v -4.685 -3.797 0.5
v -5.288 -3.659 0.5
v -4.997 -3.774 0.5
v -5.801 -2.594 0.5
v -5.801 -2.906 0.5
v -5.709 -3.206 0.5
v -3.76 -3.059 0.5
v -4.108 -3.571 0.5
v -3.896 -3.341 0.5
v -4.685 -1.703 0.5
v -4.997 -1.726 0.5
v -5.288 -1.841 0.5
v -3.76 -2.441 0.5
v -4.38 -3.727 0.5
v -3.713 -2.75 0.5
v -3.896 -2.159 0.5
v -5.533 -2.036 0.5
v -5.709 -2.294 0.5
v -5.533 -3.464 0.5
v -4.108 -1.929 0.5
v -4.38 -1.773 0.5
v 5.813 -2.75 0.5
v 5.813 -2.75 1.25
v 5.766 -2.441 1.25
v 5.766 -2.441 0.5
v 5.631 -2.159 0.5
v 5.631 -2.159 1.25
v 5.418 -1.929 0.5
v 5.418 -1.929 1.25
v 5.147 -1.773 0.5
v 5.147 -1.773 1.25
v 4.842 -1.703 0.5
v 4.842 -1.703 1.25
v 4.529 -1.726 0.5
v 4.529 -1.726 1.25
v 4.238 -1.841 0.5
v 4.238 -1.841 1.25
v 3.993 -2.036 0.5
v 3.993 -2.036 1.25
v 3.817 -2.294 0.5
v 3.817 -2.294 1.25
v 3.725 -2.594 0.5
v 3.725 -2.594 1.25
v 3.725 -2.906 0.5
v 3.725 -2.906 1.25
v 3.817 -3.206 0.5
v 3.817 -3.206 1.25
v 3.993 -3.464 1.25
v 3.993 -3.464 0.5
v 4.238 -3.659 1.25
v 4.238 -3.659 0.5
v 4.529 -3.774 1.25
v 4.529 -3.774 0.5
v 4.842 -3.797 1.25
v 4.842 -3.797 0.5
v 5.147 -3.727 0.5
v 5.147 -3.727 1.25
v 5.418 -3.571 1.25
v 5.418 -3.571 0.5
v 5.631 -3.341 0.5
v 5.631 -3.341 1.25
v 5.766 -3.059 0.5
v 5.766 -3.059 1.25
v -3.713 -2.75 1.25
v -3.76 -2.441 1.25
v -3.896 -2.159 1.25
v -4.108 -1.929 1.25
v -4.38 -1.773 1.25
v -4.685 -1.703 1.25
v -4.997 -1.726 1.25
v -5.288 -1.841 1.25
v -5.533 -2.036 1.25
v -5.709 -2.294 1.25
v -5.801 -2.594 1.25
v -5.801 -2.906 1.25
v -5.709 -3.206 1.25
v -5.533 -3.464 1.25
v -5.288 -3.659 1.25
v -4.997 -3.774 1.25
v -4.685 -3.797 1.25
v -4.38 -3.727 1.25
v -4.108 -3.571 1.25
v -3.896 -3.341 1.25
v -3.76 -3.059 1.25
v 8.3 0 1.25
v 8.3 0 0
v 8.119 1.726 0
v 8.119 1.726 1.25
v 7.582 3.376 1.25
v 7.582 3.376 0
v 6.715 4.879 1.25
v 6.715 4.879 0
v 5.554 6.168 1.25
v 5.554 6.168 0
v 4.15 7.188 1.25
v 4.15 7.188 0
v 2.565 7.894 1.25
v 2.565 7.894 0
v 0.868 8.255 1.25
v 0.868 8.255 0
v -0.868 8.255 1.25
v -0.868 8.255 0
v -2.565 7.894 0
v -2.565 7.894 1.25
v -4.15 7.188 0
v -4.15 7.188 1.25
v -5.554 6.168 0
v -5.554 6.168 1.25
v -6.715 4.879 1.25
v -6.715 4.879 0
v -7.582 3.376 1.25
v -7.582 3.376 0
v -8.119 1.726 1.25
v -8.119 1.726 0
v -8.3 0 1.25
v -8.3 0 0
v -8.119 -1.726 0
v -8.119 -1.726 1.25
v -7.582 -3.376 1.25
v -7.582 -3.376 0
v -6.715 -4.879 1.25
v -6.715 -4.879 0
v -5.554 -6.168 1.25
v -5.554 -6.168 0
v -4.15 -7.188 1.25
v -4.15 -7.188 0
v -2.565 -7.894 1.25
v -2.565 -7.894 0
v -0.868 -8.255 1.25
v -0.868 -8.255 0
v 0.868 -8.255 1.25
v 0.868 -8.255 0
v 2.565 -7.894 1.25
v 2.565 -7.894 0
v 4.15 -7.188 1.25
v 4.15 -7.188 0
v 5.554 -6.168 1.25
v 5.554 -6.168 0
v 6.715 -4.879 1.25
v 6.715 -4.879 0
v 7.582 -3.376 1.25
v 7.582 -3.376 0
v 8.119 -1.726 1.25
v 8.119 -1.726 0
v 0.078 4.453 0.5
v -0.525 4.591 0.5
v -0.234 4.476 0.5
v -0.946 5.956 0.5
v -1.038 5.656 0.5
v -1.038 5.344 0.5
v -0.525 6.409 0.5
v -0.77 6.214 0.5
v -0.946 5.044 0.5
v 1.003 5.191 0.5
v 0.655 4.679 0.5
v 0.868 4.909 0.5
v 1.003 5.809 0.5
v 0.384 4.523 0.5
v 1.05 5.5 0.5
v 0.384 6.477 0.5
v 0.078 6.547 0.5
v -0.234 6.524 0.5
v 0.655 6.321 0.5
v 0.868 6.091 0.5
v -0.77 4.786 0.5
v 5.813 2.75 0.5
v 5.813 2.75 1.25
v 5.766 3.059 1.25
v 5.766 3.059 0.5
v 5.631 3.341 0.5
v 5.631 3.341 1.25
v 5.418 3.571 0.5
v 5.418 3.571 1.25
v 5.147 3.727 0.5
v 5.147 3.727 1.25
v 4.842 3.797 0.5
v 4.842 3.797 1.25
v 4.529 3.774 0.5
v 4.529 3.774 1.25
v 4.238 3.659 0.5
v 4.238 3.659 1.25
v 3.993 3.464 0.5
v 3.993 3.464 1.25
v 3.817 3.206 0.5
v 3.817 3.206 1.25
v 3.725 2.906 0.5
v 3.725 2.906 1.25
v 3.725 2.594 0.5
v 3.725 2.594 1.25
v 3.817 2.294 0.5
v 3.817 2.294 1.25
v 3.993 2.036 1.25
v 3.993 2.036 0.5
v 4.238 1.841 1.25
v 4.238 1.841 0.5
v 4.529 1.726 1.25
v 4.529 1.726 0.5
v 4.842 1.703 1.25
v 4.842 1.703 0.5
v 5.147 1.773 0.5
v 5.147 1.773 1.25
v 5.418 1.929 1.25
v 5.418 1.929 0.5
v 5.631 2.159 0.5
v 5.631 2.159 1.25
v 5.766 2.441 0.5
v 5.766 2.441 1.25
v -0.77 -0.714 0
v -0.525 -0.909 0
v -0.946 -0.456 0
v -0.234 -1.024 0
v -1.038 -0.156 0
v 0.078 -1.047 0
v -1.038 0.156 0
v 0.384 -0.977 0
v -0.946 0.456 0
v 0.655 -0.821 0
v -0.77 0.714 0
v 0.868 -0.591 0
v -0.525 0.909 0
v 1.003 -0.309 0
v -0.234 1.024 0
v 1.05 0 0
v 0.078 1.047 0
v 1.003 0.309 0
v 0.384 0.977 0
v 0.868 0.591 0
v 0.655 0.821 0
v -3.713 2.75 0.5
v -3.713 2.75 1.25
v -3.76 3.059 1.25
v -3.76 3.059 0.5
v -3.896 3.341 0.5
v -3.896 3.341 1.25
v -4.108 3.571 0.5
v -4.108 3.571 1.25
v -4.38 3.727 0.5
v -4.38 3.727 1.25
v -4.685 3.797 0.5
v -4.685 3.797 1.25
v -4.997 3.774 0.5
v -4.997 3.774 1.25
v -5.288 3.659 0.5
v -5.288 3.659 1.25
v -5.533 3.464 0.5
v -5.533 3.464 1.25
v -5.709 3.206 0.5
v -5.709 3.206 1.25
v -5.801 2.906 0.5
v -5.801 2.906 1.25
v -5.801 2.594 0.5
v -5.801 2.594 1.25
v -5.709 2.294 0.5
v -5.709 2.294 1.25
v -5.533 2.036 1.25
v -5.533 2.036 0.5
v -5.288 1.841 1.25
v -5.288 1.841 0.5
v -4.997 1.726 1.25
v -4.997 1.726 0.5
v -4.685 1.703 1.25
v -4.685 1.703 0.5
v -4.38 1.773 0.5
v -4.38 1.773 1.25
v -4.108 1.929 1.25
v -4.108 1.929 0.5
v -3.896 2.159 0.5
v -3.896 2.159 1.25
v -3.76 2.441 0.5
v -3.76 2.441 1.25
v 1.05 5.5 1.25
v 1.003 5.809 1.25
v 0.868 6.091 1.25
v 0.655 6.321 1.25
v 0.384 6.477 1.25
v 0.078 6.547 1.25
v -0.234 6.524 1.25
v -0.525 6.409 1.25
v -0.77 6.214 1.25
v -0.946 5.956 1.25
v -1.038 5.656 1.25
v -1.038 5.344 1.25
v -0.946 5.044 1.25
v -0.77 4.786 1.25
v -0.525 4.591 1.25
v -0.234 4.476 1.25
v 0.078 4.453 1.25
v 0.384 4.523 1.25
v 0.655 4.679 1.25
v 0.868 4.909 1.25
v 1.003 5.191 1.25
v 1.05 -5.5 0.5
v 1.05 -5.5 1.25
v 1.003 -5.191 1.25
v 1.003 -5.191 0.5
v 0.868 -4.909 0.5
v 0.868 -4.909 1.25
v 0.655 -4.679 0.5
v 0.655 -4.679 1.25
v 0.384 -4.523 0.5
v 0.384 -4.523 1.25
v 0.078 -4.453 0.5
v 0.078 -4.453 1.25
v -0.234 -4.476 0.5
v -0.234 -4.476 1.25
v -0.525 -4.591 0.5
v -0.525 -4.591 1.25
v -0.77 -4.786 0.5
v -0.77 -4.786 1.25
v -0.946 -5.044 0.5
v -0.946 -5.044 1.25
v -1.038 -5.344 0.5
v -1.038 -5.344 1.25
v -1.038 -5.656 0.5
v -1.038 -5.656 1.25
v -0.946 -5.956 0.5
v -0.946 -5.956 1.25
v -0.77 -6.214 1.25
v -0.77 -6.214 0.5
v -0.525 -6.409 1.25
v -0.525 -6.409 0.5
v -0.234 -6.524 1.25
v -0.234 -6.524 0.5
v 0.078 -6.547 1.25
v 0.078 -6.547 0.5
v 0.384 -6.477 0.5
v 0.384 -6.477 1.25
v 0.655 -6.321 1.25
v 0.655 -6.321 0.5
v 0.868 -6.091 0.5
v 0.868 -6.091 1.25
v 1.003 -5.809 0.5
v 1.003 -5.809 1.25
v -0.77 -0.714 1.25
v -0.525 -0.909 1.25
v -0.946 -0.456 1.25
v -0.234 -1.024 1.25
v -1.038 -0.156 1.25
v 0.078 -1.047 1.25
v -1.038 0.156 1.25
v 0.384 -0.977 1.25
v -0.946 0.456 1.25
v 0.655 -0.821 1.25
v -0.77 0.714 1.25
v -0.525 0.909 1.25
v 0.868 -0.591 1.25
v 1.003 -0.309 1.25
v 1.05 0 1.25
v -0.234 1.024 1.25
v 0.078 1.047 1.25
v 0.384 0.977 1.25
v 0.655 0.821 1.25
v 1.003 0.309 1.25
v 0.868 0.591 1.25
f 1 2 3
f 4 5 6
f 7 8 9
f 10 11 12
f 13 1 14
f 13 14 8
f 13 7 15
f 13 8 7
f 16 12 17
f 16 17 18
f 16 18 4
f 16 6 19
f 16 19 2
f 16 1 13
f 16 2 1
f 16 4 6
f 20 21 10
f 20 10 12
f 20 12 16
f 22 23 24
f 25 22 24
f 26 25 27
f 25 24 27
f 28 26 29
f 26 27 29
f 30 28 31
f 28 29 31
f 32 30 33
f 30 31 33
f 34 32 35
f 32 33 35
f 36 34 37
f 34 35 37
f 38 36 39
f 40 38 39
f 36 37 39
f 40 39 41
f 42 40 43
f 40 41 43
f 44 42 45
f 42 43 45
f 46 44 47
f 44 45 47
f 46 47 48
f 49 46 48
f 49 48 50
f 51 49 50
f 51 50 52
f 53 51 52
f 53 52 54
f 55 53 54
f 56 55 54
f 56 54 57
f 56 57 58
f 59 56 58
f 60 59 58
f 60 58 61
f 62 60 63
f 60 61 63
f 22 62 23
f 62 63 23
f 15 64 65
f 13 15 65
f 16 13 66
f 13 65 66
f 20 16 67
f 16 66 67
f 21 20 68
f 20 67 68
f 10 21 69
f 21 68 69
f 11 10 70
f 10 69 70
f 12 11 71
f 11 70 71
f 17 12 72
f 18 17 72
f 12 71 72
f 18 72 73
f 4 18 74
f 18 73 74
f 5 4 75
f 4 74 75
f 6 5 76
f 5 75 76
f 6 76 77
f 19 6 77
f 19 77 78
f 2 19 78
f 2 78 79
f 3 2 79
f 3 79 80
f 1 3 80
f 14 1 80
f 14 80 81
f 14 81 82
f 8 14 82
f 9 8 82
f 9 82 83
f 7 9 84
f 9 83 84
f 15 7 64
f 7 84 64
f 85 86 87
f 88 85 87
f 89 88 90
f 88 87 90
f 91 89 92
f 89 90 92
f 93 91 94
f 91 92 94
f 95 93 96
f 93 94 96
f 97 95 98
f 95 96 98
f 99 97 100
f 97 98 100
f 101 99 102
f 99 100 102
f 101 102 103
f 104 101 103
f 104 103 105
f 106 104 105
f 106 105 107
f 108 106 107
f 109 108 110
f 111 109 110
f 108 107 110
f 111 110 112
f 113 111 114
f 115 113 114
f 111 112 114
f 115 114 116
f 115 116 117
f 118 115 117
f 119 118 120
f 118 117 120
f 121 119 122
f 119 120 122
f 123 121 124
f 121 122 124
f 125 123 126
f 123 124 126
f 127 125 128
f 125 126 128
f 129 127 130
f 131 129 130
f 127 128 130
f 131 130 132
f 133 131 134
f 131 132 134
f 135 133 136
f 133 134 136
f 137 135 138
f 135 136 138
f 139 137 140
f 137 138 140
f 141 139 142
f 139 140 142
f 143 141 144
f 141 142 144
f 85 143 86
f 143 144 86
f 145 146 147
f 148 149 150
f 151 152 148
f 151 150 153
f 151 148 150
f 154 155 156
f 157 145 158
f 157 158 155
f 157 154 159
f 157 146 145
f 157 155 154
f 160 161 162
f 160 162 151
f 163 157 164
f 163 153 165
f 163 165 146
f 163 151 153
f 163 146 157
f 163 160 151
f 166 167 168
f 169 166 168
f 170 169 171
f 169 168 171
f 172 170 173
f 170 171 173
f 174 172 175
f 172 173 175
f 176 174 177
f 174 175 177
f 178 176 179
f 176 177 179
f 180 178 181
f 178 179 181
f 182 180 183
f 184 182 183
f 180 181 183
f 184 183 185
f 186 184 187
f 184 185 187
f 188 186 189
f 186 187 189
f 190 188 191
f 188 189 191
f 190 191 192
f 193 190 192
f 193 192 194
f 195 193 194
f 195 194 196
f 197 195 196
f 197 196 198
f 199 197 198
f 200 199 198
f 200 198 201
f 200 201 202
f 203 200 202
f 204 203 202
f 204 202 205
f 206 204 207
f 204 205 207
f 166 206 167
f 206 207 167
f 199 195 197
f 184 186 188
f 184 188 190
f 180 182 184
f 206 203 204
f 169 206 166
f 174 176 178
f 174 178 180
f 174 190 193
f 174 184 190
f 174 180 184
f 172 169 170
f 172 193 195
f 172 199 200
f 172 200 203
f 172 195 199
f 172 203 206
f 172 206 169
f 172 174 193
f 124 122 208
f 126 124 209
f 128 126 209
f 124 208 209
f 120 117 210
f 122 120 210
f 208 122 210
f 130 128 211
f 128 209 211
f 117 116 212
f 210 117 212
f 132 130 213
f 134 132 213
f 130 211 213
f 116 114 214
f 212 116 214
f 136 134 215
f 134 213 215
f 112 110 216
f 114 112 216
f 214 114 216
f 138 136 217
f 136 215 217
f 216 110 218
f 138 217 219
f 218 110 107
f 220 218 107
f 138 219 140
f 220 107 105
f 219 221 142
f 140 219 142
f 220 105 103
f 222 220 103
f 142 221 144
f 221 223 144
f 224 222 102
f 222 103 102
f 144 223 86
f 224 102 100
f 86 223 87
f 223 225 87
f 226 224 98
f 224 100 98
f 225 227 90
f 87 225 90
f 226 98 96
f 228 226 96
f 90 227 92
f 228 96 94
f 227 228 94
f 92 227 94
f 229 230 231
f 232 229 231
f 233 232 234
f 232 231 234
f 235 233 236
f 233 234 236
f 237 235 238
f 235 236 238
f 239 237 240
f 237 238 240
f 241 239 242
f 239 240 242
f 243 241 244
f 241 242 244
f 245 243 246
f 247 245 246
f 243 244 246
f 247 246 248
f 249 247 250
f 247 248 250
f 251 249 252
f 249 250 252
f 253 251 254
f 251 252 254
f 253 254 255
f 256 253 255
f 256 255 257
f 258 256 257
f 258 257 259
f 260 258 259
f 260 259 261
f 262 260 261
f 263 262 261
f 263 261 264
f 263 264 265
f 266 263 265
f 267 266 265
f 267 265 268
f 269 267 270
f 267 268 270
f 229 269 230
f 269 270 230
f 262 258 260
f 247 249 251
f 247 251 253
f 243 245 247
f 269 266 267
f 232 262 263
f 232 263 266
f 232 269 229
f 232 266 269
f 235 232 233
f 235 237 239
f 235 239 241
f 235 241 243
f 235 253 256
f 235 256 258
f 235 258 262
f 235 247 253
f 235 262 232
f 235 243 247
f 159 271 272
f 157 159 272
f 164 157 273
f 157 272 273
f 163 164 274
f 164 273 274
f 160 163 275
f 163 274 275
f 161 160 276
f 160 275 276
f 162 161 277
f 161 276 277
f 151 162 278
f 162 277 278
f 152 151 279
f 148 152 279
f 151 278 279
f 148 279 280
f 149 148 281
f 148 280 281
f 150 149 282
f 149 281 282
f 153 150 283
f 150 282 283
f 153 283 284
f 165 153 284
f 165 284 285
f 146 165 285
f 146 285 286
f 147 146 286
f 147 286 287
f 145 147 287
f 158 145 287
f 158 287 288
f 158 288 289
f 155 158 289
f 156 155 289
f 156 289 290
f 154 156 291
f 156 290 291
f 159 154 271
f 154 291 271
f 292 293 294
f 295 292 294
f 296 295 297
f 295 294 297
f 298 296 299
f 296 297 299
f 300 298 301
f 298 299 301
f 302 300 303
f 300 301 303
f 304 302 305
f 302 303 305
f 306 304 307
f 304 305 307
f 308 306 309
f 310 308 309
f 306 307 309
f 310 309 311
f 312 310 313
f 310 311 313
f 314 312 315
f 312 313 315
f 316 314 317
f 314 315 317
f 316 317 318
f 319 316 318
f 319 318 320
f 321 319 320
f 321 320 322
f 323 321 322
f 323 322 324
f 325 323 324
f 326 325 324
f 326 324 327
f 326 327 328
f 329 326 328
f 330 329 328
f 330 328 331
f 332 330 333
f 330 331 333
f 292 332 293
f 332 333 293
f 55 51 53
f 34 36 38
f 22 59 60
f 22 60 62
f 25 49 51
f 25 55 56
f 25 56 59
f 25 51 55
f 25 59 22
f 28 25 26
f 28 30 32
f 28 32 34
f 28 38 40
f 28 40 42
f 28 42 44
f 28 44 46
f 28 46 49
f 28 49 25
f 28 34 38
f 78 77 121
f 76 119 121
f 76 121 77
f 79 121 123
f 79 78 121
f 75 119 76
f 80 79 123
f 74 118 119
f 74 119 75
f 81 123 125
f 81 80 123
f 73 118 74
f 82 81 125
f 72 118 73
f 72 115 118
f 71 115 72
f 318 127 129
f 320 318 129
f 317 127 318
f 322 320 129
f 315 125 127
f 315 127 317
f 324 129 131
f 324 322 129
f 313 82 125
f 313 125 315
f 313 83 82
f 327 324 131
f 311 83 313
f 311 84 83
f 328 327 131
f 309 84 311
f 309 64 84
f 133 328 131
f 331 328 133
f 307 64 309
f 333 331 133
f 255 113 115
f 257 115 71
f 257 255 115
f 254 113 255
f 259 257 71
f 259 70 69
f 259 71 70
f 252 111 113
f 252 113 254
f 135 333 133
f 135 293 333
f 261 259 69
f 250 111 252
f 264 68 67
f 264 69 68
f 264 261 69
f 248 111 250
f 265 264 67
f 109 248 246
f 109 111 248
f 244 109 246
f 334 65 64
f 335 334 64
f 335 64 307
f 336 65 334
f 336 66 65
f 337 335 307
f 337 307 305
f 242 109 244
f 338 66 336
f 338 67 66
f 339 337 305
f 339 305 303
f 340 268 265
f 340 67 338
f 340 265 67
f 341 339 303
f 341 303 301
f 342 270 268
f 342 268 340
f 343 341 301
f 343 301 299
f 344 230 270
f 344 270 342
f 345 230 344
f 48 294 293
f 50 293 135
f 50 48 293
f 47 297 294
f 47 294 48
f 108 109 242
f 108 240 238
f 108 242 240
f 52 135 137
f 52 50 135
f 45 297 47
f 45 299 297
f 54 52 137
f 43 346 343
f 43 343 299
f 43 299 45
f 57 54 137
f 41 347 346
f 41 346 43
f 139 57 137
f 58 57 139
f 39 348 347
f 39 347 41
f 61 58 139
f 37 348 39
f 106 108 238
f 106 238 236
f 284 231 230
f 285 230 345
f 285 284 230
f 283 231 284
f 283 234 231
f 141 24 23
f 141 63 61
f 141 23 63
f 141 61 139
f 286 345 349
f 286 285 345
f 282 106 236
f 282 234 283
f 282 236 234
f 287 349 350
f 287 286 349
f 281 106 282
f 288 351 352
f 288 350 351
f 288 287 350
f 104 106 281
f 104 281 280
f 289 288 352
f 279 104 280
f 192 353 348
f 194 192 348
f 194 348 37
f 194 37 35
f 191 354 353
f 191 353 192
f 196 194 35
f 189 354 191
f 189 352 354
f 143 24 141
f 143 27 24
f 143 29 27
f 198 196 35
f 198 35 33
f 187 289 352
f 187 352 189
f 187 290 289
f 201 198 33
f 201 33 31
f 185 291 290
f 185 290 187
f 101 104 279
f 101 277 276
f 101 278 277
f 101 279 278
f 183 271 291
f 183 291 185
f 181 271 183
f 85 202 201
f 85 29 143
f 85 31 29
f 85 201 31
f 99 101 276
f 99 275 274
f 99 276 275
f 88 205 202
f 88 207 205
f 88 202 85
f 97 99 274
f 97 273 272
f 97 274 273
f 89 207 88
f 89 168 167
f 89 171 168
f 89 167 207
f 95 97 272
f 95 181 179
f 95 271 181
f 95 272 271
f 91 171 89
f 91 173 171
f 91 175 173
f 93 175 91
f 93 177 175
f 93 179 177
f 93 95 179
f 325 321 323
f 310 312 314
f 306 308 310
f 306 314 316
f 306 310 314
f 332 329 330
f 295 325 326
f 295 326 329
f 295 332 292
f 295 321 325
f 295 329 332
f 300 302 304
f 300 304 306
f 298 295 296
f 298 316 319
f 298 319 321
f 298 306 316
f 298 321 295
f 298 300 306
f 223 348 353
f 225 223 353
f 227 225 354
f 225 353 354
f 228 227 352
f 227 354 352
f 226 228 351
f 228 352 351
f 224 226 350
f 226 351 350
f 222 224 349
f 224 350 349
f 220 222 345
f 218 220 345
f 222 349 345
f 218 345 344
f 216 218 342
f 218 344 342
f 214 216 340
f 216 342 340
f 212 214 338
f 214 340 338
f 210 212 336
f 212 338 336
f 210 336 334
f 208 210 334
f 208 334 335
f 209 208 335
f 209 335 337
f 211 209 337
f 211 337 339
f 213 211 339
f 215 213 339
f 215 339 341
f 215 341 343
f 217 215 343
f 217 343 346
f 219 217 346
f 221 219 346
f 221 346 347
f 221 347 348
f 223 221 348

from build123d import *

# Parameters (mm, degrees)
F0_R     = 8.3
F1_DEPTH = 1.25
F2_R     = 1.05
F3_DEPTH = 25
F4_R     = 1.05
F5_DEPTH = 0.75


with BuildPart() as f1:
    # F0 (on Top) → F1 (new body)
    with BuildSketch(Plane.XY):
        Circle(F0_R)
    extrude(amount=F1_DEPTH)

    # F2 (on face) → F3 (cut)
    with BuildSketch(Plane.XY.offset(1.25)):
        Circle(F2_R)
    extrude(amount=-F3_DEPTH, mode=Mode.SUBTRACT)

    # F4 (on face) → F5 (cut)
    with BuildSketch(Plane.XY.offset(1.25)):
        with Locations((0, 5.5)):
            Circle(F4_R)
        with Locations((-4.76314, 2.75)):
            Circle(F4_R)
        with Locations((-4.76314, -2.75)):
            Circle(F4_R)
        with Locations((0, -5.5)):
            Circle(F4_R)
        with Locations((4.76314, -2.75)):
            Circle(F4_R)
        with Locations((4.76314, 2.75)):
            Circle(F4_R)
    extrude(amount=-F5_DEPTH, mode=Mode.SUBTRACT)


solid = f1.part
